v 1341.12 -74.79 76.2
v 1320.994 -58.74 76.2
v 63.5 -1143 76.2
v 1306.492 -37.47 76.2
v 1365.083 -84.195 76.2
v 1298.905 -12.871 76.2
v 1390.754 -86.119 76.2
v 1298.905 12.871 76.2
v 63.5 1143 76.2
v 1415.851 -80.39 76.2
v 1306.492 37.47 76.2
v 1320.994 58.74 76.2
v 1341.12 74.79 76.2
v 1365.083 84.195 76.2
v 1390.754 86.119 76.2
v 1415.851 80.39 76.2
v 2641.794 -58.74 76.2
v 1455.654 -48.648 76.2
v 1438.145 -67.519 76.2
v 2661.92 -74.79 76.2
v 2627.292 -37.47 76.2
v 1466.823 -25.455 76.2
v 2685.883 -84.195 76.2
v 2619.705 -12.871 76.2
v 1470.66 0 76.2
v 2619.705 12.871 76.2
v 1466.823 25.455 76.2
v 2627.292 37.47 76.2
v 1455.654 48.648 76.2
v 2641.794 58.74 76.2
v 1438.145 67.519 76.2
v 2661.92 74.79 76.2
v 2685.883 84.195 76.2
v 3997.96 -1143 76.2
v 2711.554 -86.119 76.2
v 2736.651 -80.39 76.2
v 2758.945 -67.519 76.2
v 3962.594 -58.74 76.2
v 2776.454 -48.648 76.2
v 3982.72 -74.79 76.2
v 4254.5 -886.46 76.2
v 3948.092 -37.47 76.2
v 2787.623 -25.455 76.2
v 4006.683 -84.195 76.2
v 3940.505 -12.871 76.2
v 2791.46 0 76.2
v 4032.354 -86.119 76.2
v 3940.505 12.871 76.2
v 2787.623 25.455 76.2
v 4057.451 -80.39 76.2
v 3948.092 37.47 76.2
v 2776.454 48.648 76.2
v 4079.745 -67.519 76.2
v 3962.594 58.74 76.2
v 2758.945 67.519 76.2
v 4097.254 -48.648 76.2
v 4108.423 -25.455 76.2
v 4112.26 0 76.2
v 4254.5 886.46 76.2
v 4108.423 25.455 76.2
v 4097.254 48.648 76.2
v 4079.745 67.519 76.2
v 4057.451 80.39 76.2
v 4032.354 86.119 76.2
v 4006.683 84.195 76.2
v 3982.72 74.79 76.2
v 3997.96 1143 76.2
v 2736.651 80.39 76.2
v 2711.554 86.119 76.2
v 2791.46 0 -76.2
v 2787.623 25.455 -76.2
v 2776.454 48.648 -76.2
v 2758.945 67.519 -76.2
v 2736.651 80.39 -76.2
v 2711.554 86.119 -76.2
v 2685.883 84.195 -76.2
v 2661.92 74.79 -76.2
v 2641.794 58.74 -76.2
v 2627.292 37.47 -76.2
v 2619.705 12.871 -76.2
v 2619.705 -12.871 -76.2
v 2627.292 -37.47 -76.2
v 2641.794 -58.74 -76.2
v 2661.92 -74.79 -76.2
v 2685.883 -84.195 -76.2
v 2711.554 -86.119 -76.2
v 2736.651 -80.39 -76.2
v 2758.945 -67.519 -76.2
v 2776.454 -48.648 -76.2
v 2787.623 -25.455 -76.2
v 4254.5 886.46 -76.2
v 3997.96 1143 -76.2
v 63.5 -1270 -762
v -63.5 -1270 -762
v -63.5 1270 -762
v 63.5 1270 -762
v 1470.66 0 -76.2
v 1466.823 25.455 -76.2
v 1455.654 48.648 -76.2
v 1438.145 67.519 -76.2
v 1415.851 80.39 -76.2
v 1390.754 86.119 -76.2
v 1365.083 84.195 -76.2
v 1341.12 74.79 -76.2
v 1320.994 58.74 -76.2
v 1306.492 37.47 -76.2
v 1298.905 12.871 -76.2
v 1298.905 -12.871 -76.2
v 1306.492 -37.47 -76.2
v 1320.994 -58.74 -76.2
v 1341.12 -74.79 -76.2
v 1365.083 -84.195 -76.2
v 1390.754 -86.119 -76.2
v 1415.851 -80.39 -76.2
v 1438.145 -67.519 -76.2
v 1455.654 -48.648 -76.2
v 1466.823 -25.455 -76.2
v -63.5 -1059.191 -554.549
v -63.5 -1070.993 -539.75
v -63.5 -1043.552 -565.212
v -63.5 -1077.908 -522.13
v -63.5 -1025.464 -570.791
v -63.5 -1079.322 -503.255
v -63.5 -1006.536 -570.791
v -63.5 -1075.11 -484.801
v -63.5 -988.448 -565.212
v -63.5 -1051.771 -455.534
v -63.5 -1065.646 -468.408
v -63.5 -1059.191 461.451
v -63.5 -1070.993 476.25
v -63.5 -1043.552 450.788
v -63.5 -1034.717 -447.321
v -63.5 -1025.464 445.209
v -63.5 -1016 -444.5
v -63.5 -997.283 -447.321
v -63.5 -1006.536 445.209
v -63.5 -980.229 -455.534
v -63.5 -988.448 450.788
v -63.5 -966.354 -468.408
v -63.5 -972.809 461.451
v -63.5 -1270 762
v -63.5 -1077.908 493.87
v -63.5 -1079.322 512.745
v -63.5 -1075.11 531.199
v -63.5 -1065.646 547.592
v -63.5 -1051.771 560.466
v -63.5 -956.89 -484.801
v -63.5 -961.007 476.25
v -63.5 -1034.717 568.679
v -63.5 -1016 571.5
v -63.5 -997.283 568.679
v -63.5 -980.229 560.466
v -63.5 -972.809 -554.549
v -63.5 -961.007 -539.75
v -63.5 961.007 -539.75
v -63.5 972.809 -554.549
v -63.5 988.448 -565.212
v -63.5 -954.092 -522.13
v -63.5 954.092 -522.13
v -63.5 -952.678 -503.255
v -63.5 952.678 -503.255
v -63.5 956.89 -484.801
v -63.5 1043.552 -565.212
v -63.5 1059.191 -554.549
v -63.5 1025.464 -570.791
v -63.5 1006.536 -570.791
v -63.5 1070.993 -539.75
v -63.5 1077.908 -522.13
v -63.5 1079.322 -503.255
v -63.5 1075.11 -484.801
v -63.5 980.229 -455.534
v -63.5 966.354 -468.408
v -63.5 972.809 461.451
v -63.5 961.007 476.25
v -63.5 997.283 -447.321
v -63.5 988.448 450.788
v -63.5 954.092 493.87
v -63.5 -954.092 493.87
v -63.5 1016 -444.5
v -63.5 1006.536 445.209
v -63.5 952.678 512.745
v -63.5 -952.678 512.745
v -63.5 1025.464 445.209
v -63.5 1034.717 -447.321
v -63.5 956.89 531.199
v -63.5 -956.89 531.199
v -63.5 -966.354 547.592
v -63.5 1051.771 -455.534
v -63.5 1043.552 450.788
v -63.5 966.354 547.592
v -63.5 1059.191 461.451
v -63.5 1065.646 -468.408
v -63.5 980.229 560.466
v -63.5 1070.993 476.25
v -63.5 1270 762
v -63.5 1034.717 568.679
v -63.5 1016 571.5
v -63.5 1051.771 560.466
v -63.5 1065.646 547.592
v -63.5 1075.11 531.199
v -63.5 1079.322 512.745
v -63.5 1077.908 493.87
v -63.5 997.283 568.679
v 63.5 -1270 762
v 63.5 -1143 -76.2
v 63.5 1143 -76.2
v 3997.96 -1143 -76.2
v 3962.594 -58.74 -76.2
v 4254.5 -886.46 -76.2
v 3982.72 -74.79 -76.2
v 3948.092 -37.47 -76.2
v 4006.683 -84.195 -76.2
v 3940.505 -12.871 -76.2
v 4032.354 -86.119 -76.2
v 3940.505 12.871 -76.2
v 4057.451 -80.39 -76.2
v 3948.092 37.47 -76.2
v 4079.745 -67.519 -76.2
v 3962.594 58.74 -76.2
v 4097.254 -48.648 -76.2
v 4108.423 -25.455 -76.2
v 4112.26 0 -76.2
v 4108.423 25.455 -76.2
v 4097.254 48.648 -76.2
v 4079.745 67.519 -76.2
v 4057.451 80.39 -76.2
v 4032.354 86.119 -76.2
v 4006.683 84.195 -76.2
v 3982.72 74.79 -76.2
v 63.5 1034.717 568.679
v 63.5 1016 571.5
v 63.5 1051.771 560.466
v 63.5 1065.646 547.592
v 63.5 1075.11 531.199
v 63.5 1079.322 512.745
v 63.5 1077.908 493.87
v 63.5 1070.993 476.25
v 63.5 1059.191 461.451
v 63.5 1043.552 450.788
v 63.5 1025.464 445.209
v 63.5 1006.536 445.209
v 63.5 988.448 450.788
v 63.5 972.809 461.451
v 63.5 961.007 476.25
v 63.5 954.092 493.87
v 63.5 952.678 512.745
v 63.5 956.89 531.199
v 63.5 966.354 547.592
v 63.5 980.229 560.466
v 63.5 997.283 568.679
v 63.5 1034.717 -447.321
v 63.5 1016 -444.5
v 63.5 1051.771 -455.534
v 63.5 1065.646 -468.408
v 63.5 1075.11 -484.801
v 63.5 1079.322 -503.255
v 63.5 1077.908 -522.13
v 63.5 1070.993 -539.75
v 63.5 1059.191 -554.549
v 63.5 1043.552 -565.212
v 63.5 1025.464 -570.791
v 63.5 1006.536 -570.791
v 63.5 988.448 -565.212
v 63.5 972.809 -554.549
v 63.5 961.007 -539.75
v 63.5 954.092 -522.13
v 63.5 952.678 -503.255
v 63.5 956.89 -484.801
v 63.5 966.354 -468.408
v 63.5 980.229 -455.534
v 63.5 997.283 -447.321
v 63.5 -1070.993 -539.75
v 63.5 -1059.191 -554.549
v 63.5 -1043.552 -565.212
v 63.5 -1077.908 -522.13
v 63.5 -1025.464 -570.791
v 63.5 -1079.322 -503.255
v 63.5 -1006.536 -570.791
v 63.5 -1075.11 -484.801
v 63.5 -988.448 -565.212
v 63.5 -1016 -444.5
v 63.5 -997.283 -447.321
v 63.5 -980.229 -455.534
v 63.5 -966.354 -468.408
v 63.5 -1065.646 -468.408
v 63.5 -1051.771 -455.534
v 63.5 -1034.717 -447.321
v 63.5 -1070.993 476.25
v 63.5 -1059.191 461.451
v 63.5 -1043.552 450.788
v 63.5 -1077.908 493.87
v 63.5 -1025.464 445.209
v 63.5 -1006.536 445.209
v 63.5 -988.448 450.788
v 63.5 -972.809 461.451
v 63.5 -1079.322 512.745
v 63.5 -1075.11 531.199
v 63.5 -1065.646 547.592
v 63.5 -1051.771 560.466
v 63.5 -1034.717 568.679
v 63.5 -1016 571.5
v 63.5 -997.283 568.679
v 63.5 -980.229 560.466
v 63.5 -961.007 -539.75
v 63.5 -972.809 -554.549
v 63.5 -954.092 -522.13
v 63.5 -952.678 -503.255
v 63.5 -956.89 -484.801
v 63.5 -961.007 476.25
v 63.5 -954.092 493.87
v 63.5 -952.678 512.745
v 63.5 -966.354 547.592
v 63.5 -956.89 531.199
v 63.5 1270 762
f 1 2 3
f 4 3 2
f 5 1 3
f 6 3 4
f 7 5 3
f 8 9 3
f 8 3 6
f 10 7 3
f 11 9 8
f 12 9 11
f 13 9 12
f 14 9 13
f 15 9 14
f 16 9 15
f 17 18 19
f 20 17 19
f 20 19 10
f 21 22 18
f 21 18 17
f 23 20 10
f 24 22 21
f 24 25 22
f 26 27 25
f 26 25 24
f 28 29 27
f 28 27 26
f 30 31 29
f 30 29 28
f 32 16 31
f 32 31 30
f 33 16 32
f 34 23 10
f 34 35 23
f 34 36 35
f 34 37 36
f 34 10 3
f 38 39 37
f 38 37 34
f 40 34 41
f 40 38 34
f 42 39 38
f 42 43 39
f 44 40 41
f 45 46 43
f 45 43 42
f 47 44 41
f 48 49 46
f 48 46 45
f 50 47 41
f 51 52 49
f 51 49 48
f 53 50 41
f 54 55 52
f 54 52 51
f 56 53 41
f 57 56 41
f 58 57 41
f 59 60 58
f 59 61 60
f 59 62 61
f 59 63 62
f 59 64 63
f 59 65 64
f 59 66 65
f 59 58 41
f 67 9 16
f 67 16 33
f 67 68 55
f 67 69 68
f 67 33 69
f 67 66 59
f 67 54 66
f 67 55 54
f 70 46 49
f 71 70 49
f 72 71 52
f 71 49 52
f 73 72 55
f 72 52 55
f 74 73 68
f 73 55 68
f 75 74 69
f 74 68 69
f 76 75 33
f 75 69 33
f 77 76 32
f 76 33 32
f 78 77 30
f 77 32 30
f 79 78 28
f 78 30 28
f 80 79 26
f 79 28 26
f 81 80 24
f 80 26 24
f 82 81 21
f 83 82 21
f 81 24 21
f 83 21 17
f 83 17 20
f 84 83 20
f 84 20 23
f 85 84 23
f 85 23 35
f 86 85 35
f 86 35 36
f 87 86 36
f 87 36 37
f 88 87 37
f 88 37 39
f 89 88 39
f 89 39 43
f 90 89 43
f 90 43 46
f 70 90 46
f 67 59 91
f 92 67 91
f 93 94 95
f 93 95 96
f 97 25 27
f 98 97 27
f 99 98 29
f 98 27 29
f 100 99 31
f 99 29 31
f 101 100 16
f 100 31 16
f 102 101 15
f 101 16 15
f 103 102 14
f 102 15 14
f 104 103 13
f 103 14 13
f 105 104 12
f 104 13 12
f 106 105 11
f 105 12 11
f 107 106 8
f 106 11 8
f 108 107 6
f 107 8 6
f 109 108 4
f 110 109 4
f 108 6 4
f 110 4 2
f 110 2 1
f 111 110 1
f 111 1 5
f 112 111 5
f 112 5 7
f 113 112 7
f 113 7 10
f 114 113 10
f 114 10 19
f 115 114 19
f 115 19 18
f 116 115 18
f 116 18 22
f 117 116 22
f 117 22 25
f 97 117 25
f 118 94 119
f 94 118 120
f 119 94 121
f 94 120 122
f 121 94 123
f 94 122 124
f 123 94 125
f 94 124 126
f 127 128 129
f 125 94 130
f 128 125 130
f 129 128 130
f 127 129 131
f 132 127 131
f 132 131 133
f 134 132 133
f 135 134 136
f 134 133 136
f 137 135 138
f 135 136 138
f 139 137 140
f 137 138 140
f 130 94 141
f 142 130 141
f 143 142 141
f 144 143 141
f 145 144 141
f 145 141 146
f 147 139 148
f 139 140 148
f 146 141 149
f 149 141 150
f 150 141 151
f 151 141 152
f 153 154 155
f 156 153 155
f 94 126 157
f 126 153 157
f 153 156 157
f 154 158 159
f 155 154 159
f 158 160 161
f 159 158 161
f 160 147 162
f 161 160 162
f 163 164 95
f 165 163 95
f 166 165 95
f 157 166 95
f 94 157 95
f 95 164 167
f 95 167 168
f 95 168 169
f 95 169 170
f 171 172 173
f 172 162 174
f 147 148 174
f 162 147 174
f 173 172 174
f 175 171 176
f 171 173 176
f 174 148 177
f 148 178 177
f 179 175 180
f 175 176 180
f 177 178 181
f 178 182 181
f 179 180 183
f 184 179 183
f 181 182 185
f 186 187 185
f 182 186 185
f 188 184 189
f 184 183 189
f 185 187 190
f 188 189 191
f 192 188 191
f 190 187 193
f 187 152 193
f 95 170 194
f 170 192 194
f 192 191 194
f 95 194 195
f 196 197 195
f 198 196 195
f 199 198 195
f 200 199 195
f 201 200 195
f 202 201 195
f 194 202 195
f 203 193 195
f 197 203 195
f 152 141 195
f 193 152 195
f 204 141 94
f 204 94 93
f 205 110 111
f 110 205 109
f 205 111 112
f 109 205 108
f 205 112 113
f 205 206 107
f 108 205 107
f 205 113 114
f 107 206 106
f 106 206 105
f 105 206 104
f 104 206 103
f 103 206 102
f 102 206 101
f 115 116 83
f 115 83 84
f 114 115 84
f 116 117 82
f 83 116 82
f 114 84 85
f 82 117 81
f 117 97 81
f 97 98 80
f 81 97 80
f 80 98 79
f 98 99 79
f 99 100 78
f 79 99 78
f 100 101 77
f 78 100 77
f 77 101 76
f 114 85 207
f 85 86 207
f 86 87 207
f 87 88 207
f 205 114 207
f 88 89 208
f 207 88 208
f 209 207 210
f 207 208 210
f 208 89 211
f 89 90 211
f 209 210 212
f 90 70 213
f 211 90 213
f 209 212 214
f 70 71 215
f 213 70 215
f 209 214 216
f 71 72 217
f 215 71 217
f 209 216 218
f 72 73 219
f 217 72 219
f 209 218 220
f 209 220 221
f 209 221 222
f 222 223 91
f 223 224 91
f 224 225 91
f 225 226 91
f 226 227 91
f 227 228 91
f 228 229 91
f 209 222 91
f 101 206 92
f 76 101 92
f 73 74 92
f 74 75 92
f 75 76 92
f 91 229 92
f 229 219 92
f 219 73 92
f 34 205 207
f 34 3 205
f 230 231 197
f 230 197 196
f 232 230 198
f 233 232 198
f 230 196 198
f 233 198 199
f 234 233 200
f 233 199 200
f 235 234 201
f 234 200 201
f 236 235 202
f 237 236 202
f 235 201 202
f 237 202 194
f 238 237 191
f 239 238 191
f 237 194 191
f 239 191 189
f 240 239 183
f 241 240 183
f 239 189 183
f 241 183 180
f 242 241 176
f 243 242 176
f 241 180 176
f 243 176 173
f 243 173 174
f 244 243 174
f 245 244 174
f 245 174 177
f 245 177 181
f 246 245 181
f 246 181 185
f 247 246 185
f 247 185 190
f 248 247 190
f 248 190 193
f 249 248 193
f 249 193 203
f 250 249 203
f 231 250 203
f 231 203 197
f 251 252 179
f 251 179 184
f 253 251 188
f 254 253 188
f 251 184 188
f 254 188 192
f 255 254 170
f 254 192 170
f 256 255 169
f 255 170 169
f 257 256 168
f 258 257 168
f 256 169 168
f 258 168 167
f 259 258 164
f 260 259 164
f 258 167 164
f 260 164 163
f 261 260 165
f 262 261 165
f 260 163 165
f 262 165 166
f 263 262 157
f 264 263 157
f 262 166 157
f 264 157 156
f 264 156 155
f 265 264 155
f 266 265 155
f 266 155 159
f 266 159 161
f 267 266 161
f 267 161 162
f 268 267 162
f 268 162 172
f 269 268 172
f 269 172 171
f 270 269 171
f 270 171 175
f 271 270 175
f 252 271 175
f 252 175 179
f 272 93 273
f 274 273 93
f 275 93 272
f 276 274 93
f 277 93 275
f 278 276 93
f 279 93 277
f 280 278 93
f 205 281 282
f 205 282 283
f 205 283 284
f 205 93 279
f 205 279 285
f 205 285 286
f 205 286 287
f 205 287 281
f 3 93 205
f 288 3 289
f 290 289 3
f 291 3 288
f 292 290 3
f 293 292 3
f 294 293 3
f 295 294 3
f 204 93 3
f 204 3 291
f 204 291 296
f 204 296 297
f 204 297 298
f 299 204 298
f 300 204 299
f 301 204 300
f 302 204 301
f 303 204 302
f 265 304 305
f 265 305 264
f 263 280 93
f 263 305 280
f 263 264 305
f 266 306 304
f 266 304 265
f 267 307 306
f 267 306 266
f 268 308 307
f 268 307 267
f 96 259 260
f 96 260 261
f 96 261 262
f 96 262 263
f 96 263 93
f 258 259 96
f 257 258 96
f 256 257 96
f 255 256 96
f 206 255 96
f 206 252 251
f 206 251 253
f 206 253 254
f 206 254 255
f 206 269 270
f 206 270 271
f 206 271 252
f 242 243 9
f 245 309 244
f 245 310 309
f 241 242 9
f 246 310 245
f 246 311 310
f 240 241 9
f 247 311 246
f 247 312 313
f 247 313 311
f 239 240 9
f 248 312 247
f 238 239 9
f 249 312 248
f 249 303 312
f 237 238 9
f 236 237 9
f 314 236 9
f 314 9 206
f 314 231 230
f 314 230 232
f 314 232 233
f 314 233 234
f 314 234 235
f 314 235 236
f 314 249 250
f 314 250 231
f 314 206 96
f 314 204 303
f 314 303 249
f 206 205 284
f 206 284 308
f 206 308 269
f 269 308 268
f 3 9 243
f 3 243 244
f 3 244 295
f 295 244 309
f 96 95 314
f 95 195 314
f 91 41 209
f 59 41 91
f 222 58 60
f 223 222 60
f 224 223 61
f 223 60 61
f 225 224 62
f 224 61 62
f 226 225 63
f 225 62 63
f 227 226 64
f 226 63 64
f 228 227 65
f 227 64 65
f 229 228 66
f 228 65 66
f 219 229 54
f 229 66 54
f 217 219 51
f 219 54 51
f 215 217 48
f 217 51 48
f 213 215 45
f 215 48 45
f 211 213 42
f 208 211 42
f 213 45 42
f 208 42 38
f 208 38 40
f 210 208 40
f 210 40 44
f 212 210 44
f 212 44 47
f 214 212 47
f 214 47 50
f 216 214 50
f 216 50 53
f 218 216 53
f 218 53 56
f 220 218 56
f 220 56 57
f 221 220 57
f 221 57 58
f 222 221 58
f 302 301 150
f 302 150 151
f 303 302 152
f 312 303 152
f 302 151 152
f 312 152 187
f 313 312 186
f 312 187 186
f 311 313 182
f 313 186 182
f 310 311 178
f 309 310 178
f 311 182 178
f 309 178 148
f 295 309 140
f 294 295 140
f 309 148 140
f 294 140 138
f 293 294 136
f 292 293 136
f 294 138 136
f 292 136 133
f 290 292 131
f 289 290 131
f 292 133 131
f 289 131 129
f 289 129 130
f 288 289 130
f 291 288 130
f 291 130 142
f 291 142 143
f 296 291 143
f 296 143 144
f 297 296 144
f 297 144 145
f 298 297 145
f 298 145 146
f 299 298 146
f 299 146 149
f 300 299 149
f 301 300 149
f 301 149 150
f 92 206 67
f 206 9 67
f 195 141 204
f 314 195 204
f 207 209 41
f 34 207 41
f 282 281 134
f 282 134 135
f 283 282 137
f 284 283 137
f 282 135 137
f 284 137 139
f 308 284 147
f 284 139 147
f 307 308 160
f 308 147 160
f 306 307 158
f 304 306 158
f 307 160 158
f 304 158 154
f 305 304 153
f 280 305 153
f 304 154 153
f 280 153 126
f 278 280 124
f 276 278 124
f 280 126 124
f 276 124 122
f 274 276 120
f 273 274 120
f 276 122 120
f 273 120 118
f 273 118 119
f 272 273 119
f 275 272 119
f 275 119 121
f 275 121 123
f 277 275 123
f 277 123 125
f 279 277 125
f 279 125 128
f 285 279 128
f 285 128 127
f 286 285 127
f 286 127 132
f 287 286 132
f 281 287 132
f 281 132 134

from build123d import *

# Parameters (mm, degrees)
SKETCH1_W           = 127
SKETCH1_H           = 2540
BOSS_EXTRUDE1_DEPTH = 762
SKETCH2_W           = 4191
SKETCH2_H           = 2286
BOSS_EXTRUDE2_DEPTH = 76.2
SKETCH3_R           = 63.5
CUT_EXTRUDE1_DEPTH  = 152.4
SKETCH4_R           = 86.36
CUT_EXTRUDE2_DEPTH  = 839.2
CHAMFER1_SIZE       = 256.54


with BuildPart() as part:
    # Sketch1 → Boss-Extrude1 (new body, symmetric)
    with BuildSketch(Plane.XY):
        Rectangle(SKETCH1_W, SKETCH1_H)
    extrude(amount=BOSS_EXTRUDE1_DEPTH, both=True)

    # Sketch2 → Boss-Extrude2 (add, symmetric)
    with BuildSketch(Plane.XY):
        with Locations((2159, 0)):
            Rectangle(SKETCH2_W, SKETCH2_H)
    extrude(amount=BOSS_EXTRUDE2_DEPTH, both=True)

    # Sketch3 → Cut-Extrude1 (cut)
    with BuildSketch(Plane.ZY.offset(63.5)):
        with Locations((-508, 1016)):
            Circle(SKETCH3_R)
        with Locations((-508, -1016)):
            Circle(SKETCH3_R)
        with Locations((508, -1016)):
            Circle(SKETCH3_R)
        with Locations((508, 1016)):
            Circle(SKETCH3_R)
    extrude(amount=-CUT_EXTRUDE1_DEPTH, mode=Mode.SUBTRACT)

    # Sketch4 → Cut-Extrude2 (cut, through all)
    with BuildSketch(Plane.XY.offset(76.2)):
        with Locations((4025.9, 0)):
            Circle(SKETCH4_R)
        with Locations((2705.1, 0)):
            Circle(SKETCH4_R)
        with Locations((1384.3, 0)):
            Circle(SKETCH4_R)
    extrude(amount=-CUT_EXTRUDE2_DEPTH, mode=Mode.SUBTRACT)

    # Chamfer1
    chamfer1_edges = [part.edges().sort_by_distance(p)[0] for p in [
        (4254.5, -1143, 0),
        (4254.5, 1143, 0),
    ]]
    chamfer(chamfer1_edges, length=CHAMFER1_SIZE)


solid = part.part
